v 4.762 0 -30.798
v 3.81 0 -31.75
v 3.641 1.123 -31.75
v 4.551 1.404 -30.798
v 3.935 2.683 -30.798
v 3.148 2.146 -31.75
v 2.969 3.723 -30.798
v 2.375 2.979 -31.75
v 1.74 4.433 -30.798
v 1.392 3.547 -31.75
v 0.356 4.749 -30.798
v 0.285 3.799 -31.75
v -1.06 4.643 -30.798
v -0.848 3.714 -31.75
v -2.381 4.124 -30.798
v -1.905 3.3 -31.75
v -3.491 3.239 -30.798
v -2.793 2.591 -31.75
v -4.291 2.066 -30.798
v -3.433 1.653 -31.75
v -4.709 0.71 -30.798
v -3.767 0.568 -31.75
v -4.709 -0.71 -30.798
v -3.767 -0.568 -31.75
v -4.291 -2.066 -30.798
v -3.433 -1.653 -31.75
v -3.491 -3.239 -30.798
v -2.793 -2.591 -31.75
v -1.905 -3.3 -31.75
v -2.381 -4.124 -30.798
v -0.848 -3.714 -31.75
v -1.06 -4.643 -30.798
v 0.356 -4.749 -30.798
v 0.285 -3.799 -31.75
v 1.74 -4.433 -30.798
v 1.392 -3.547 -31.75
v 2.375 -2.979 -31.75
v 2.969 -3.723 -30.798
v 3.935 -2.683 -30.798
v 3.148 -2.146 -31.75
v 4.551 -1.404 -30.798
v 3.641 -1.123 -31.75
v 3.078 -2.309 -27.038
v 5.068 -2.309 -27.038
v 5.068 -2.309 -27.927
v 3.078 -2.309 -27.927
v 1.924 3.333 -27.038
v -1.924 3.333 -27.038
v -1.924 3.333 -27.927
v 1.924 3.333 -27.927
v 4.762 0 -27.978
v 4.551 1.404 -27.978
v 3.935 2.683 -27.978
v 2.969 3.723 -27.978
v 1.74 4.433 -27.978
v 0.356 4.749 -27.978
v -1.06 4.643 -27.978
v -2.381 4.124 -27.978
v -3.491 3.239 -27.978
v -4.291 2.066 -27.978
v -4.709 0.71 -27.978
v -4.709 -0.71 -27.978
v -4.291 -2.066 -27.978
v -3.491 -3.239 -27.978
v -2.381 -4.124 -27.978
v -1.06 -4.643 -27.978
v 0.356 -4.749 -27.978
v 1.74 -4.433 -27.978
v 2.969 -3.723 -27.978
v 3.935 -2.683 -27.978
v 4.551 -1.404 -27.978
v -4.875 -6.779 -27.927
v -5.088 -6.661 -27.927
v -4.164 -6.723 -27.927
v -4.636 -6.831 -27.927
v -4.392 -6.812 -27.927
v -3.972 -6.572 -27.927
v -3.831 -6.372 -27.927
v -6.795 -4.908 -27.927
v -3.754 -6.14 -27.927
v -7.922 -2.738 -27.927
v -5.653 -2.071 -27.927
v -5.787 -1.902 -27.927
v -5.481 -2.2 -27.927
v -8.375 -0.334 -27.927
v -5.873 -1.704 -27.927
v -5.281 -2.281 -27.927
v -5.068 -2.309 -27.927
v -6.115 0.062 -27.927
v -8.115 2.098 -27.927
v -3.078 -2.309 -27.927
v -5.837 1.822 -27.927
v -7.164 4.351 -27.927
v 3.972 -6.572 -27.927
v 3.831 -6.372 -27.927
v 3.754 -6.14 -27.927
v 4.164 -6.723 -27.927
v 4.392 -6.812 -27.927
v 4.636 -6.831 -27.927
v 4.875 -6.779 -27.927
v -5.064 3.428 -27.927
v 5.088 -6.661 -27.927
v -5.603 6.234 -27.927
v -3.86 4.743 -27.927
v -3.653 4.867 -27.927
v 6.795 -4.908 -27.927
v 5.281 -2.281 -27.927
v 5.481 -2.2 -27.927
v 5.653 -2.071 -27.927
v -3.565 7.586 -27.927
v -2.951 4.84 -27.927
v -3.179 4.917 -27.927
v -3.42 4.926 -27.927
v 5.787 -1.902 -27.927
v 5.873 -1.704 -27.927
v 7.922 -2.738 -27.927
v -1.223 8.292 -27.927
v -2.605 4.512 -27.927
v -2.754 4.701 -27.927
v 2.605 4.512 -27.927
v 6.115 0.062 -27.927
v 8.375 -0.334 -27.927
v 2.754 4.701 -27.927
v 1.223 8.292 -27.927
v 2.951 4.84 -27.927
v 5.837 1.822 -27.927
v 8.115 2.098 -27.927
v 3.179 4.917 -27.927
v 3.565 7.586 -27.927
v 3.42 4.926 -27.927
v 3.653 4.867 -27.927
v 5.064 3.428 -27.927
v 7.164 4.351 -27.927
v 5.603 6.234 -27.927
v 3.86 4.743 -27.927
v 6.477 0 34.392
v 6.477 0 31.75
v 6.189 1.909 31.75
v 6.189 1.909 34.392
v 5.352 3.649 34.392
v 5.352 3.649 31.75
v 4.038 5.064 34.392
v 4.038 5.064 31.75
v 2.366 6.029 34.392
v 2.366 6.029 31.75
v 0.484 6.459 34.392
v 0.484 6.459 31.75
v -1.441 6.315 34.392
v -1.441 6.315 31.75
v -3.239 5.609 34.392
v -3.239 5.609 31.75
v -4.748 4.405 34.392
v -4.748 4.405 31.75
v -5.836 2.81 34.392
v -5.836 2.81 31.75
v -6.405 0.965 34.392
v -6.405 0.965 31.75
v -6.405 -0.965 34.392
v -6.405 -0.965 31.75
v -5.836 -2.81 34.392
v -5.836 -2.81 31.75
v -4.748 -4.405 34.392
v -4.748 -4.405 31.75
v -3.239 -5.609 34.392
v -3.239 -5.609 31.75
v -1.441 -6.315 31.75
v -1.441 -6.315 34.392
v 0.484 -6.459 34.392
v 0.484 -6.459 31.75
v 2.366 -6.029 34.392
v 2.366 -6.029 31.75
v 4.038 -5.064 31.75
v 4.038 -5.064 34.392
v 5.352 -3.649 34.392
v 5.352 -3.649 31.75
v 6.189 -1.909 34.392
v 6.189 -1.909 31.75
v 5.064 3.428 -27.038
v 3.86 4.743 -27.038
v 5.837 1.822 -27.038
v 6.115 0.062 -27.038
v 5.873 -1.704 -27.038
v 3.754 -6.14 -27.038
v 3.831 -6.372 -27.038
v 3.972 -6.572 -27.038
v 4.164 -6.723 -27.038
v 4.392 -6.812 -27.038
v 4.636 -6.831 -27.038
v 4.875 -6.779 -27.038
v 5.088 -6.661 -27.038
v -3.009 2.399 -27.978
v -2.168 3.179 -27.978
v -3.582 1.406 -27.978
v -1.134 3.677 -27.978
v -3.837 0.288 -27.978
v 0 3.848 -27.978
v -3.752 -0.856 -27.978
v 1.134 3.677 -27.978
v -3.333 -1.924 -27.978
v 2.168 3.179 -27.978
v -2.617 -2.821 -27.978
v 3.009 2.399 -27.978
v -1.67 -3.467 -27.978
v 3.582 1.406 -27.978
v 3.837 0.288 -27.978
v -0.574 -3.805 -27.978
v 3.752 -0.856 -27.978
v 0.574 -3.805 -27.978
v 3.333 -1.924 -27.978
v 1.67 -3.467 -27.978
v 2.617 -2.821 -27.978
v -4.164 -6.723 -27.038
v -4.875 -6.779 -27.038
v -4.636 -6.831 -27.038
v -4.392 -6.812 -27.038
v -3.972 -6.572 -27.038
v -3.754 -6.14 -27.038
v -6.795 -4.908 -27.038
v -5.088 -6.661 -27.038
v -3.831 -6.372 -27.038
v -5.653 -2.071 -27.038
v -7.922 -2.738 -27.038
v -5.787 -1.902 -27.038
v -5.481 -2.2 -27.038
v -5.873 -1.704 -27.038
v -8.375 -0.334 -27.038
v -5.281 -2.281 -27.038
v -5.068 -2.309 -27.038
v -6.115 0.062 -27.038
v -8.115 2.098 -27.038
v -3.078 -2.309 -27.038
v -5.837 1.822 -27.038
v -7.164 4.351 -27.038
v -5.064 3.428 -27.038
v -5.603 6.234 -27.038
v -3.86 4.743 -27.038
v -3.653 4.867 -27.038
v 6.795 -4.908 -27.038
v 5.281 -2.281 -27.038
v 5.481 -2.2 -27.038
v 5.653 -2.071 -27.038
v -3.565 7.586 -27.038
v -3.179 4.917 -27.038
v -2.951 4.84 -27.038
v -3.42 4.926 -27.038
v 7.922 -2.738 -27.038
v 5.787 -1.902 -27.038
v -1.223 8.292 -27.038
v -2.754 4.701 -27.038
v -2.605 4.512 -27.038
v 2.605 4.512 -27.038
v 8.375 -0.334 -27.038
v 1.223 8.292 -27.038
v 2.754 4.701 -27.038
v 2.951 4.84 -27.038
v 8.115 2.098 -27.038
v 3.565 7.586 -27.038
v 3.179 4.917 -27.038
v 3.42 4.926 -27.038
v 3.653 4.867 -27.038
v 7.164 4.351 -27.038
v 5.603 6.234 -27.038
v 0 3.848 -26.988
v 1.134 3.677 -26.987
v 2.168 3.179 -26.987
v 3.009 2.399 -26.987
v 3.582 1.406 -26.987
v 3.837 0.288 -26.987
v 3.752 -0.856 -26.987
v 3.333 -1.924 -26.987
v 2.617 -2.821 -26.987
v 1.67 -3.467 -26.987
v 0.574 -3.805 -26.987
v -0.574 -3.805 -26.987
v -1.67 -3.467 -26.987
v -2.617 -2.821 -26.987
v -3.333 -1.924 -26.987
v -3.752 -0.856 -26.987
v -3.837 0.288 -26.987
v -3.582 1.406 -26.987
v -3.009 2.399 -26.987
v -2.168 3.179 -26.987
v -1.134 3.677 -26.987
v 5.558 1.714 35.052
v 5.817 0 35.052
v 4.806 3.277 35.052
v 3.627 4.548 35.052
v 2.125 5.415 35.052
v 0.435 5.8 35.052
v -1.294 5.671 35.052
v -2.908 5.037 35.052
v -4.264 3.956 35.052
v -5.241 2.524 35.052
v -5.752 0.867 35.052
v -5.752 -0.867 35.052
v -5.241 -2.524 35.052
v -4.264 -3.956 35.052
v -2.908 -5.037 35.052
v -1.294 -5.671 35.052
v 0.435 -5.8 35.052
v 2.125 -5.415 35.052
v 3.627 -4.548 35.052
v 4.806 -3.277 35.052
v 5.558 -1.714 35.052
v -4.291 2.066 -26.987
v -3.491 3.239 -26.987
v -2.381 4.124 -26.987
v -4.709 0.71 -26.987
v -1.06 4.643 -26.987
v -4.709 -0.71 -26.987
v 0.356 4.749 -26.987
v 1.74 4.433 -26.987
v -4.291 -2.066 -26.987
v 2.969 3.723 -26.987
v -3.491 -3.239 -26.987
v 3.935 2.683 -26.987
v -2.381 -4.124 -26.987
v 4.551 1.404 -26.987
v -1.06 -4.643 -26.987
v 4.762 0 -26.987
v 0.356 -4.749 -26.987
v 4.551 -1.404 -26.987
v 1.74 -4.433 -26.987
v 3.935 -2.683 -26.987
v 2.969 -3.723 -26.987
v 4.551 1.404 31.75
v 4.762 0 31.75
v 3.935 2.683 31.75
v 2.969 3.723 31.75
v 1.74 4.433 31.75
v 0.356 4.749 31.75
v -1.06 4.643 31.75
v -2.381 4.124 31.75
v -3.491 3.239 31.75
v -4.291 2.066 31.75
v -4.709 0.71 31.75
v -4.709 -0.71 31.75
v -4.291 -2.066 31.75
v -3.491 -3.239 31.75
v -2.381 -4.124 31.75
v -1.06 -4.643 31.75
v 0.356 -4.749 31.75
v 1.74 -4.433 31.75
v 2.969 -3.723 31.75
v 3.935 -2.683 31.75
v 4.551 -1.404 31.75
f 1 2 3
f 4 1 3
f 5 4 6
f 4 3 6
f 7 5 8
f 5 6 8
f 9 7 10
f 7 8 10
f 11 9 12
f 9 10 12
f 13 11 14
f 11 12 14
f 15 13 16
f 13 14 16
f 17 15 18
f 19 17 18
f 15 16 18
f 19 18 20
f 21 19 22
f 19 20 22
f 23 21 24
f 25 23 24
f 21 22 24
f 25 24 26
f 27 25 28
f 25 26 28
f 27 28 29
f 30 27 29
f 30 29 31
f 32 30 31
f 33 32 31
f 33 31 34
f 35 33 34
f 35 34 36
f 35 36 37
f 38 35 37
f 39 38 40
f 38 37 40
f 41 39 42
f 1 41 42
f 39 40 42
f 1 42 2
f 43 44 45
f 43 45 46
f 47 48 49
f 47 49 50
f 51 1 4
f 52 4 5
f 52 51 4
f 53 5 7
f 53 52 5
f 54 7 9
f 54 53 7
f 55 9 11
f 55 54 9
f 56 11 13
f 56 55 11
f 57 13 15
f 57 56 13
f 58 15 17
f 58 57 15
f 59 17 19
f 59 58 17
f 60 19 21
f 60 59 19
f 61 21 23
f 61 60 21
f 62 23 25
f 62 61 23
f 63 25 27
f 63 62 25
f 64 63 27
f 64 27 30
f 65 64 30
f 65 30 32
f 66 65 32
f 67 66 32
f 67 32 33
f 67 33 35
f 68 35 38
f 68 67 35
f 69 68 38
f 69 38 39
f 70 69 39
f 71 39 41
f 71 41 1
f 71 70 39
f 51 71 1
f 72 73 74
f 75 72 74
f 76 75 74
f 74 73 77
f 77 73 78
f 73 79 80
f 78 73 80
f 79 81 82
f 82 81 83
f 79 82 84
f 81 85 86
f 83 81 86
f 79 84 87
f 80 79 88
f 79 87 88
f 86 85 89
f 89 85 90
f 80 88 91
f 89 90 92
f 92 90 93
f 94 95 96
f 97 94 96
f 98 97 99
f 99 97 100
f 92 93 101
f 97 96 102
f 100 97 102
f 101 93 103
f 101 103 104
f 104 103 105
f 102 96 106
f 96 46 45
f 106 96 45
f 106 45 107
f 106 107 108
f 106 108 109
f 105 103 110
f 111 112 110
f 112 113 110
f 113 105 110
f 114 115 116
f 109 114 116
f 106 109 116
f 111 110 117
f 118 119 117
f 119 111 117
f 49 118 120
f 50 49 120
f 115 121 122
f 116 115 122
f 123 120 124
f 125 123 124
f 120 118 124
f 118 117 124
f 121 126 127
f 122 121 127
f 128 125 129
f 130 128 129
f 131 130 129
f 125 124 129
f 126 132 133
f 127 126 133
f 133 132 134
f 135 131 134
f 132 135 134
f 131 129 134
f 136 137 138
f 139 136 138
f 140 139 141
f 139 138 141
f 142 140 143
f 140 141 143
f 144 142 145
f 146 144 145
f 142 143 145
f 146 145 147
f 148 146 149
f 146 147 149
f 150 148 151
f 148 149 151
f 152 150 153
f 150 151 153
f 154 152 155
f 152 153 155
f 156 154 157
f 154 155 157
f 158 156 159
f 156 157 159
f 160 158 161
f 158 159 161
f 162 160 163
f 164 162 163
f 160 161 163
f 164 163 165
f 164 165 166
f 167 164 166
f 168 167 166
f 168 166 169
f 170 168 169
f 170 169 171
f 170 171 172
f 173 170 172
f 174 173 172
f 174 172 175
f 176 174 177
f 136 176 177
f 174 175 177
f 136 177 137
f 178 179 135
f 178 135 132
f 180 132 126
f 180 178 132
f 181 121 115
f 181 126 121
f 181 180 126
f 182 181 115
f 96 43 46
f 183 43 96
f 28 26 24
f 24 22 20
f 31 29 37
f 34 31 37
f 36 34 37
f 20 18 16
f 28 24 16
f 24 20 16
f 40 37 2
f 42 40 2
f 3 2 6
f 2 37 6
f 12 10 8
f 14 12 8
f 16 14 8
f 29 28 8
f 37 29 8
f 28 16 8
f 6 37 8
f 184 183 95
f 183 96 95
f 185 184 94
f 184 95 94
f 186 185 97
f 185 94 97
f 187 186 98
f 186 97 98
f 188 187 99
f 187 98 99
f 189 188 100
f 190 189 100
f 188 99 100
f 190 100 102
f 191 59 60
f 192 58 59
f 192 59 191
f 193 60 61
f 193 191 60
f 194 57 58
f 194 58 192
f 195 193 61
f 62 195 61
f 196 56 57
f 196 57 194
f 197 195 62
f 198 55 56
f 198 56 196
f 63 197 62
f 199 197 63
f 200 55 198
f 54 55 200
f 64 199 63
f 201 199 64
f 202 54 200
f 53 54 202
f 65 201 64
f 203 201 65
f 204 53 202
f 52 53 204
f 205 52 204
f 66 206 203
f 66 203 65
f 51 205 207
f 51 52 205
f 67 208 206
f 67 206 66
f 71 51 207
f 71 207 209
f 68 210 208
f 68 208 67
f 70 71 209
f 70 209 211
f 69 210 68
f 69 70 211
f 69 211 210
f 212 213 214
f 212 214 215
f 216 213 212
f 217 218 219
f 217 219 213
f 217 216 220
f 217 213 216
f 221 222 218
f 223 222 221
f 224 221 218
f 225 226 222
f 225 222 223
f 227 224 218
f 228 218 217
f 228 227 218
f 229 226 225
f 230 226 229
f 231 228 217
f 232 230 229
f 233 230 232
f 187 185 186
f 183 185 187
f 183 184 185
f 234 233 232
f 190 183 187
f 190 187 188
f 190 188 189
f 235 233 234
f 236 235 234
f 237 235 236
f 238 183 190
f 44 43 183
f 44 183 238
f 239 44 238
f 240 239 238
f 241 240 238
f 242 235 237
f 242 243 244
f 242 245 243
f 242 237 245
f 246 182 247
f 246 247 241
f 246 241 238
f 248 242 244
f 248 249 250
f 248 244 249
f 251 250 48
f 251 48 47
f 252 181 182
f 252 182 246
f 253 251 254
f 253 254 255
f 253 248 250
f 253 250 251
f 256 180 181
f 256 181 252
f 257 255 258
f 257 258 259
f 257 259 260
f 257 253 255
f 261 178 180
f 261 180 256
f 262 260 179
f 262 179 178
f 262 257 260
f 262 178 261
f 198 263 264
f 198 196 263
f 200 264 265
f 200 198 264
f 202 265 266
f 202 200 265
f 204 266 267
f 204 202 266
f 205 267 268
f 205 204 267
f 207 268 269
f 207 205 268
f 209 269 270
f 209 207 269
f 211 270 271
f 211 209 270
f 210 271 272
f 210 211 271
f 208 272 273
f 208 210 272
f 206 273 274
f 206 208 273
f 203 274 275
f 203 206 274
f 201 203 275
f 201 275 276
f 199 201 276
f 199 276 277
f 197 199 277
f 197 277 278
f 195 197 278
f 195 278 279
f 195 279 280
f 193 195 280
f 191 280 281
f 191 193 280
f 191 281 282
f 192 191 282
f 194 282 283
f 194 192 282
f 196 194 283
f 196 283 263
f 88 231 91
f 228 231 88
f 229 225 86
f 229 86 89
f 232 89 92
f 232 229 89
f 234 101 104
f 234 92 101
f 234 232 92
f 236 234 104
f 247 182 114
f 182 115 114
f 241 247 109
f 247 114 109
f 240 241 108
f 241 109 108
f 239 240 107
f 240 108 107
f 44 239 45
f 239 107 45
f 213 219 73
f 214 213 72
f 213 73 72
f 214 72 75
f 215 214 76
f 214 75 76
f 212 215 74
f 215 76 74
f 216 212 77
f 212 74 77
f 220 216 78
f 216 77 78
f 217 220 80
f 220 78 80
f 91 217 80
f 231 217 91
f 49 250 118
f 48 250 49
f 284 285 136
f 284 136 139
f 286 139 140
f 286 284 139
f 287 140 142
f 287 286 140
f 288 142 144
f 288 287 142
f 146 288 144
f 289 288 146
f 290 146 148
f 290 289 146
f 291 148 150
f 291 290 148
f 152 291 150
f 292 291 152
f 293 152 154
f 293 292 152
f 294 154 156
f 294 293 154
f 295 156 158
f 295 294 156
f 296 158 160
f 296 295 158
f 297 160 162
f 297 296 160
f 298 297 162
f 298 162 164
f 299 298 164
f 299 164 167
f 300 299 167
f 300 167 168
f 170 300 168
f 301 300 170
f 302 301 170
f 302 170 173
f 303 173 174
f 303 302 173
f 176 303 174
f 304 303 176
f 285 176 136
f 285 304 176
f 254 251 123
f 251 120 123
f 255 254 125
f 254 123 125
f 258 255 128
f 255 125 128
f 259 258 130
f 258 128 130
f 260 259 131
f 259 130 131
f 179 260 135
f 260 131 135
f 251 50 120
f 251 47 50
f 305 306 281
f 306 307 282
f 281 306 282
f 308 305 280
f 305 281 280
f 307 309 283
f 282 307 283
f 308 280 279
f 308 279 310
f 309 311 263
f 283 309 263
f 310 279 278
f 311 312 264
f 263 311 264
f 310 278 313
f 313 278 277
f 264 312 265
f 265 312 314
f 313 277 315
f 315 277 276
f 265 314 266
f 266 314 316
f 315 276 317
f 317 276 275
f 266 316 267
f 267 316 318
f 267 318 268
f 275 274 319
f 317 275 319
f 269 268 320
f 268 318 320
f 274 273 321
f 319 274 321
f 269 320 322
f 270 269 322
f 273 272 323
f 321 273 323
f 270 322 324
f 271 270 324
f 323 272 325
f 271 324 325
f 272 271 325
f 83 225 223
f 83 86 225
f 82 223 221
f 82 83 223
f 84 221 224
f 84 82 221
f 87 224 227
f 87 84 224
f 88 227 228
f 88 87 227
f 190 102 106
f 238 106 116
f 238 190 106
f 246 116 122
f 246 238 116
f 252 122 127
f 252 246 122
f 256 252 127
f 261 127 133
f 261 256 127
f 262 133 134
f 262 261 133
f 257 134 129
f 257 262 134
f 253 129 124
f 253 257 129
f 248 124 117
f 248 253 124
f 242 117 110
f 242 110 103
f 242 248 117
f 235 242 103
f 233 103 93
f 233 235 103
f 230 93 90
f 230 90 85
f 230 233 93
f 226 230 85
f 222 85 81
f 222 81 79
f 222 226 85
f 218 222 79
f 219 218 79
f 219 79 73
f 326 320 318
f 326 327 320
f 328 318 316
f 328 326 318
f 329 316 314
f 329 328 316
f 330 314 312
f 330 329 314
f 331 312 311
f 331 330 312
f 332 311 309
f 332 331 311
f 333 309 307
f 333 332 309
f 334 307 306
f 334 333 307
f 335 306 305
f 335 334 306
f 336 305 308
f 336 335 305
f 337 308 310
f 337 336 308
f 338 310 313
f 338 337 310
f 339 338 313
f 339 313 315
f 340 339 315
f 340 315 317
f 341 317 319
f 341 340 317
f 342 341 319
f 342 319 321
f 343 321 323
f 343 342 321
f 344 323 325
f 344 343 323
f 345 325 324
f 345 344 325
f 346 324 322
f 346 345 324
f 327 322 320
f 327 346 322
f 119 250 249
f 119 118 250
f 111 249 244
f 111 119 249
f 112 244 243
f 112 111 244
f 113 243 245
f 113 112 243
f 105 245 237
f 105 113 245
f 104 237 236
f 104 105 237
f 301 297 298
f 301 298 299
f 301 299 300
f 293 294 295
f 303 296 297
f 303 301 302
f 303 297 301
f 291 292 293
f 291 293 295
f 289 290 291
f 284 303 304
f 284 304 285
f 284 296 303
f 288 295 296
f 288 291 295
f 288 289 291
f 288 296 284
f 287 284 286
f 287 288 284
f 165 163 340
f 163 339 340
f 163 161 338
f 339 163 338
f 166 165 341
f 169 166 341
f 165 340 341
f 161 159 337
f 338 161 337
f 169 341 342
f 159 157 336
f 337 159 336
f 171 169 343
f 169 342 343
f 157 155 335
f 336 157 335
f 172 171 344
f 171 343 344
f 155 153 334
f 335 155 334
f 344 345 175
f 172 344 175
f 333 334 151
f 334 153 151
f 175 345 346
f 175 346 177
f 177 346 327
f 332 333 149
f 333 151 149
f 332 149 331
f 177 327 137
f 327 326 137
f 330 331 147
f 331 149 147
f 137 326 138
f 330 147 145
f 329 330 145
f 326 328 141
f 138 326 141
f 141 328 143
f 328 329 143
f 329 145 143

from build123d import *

# Parameters (mm, degrees)
SKETCH2_R      = 4.7625
EXTRUDE1_DEPTH = 31.75
SKETCH3_W      = 0.9906
SKETCH3_H      = 0.9144
SKETCH8_R      = 6.477
EXTRUDE6_DEPTH = 3.302
CHAMFER2_SIZE  = 0.6604
SKETCH4_R      = 8.382
SKETCH4_R_2    = 3.8481
EXTRUDE2_DEPTH = 0.4445
EXTRUDE4_DEPTH = 32.75
EXTRUDE5_DEPTH = 0.889
FILLET1_R      = 0.8382
CHAMFER1_SIZE  = 0.9525


with BuildPart() as part:
    # Sketch2 → Extrude1 (new body, symmetric)
    with BuildSketch(Plane.XY):
        Circle(SKETCH2_R)
    extrude(amount=EXTRUDE1_DEPTH, both=True)

    # Sketch3 → Cut-Revolve1 (revolve, cut)
    with BuildSketch(Plane(origin=(0, 0, 0), x_dir=(0, 0, -1), z_dir=(1, 0, 0))):
        with Locations((27.4828, 4.3053)):
            Rectangle(SKETCH3_W, SKETCH3_H)
    revolve(axis=Axis((0, 0, 31.75), (0, 0, -1)), mode=Mode.SUBTRACT)

    # Sketch8 → Extrude6 (add)
    with BuildSketch(Plane.XY.offset(31.75)):
        Circle(SKETCH8_R)
    extrude(amount=EXTRUDE6_DEPTH)

    # Chamfer2
    chamfer2_edges = [part.edges().sort_by_distance(p)[0] for p in [
        (-6.477, 0, 35.052),
    ]]
    chamfer(chamfer2_edges, length=CHAMFER2_SIZE)

    # Chamfer1
    chamfer1_edges = [part.edges().sort_by_distance(p)[0] for p in [
        (-4.7625, 0, -31.75),
    ]]
    chamfer(chamfer1_edges, length=CHAMFER1_SIZE)


with BuildPart() as body_2:
    # Sketch4 → Extrude2 (new body, symmetric)
    with BuildSketch(Plane.XY.offset(-27.4828)):
        Circle(SKETCH4_R)
        Circle(SKETCH4_R_2, mode=Mode.SUBTRACT)
    extrude(amount=EXTRUDE2_DEPTH, both=True)

    # Sketch5 → Extrude4 (cut, through all)
    with BuildSketch(Plane.XY):
        with BuildLine():
            Line((-3.057525, 5.295788645), (0, 0))
            Line((0, 0), (3.057525, 5.295788645))
            ThreePointArc((3.057525, 5.295788645), (5.785069674, 1.981616859), (5.662420154, -2.30886))
            Line((5.662420154, -2.30886), (3.07848, -2.30886))
            Line((3.07848, -2.30886), (3.972784338, -7.380711931))
            ThreePointArc((3.972784338, -7.380711931), (0, -8.382), (-3.972784338, -7.380711931))
            Line((-3.972784338, -7.380711931), (-3.07848, -2.30886))
            Line((-3.07848, -2.30886), (-5.662420154, -2.30886))
            ThreePointArc((-5.662420154, -2.30886), (-5.785069674, 1.981616859), (-3.057525, 5.295788645))
        make_face()
    extrude(amount=-EXTRUDE4_DEPTH, mode=Mode.SUBTRACT)

    # Sketch6 → Extrude5 (add)
    with BuildSketch(Plane.XY.offset(-27.0383)):
        with BuildLine():
            Line((-1.92405, 3.332552356), (1.92405, 3.332552356))
            ThreePointArc((1.92405, 3.332552356), (0, 3.8481), (-1.92405, 3.332552356))
        make_face()
    extrude(amount=-EXTRUDE5_DEPTH)

    # Fillet1
    fillet1_edges = [body_2.edges().sort_by_distance(p)[0] for p in [
        (3.057525, 5.295788645, -27.4828),
        (3.972784338, -7.380711931, -27.4828),
        (-5.662420154, -2.30886, -27.4828),
        (5.662420154, -2.30886, -27.4828),
        (-3.972784338, -7.380711931, -27.4828),
        (-3.057525, 5.295788645, -27.4828),
    ]]
    fillet(fillet1_edges, radius=FILLET1_R)


solid = Compound([part.part, body_2.part])
